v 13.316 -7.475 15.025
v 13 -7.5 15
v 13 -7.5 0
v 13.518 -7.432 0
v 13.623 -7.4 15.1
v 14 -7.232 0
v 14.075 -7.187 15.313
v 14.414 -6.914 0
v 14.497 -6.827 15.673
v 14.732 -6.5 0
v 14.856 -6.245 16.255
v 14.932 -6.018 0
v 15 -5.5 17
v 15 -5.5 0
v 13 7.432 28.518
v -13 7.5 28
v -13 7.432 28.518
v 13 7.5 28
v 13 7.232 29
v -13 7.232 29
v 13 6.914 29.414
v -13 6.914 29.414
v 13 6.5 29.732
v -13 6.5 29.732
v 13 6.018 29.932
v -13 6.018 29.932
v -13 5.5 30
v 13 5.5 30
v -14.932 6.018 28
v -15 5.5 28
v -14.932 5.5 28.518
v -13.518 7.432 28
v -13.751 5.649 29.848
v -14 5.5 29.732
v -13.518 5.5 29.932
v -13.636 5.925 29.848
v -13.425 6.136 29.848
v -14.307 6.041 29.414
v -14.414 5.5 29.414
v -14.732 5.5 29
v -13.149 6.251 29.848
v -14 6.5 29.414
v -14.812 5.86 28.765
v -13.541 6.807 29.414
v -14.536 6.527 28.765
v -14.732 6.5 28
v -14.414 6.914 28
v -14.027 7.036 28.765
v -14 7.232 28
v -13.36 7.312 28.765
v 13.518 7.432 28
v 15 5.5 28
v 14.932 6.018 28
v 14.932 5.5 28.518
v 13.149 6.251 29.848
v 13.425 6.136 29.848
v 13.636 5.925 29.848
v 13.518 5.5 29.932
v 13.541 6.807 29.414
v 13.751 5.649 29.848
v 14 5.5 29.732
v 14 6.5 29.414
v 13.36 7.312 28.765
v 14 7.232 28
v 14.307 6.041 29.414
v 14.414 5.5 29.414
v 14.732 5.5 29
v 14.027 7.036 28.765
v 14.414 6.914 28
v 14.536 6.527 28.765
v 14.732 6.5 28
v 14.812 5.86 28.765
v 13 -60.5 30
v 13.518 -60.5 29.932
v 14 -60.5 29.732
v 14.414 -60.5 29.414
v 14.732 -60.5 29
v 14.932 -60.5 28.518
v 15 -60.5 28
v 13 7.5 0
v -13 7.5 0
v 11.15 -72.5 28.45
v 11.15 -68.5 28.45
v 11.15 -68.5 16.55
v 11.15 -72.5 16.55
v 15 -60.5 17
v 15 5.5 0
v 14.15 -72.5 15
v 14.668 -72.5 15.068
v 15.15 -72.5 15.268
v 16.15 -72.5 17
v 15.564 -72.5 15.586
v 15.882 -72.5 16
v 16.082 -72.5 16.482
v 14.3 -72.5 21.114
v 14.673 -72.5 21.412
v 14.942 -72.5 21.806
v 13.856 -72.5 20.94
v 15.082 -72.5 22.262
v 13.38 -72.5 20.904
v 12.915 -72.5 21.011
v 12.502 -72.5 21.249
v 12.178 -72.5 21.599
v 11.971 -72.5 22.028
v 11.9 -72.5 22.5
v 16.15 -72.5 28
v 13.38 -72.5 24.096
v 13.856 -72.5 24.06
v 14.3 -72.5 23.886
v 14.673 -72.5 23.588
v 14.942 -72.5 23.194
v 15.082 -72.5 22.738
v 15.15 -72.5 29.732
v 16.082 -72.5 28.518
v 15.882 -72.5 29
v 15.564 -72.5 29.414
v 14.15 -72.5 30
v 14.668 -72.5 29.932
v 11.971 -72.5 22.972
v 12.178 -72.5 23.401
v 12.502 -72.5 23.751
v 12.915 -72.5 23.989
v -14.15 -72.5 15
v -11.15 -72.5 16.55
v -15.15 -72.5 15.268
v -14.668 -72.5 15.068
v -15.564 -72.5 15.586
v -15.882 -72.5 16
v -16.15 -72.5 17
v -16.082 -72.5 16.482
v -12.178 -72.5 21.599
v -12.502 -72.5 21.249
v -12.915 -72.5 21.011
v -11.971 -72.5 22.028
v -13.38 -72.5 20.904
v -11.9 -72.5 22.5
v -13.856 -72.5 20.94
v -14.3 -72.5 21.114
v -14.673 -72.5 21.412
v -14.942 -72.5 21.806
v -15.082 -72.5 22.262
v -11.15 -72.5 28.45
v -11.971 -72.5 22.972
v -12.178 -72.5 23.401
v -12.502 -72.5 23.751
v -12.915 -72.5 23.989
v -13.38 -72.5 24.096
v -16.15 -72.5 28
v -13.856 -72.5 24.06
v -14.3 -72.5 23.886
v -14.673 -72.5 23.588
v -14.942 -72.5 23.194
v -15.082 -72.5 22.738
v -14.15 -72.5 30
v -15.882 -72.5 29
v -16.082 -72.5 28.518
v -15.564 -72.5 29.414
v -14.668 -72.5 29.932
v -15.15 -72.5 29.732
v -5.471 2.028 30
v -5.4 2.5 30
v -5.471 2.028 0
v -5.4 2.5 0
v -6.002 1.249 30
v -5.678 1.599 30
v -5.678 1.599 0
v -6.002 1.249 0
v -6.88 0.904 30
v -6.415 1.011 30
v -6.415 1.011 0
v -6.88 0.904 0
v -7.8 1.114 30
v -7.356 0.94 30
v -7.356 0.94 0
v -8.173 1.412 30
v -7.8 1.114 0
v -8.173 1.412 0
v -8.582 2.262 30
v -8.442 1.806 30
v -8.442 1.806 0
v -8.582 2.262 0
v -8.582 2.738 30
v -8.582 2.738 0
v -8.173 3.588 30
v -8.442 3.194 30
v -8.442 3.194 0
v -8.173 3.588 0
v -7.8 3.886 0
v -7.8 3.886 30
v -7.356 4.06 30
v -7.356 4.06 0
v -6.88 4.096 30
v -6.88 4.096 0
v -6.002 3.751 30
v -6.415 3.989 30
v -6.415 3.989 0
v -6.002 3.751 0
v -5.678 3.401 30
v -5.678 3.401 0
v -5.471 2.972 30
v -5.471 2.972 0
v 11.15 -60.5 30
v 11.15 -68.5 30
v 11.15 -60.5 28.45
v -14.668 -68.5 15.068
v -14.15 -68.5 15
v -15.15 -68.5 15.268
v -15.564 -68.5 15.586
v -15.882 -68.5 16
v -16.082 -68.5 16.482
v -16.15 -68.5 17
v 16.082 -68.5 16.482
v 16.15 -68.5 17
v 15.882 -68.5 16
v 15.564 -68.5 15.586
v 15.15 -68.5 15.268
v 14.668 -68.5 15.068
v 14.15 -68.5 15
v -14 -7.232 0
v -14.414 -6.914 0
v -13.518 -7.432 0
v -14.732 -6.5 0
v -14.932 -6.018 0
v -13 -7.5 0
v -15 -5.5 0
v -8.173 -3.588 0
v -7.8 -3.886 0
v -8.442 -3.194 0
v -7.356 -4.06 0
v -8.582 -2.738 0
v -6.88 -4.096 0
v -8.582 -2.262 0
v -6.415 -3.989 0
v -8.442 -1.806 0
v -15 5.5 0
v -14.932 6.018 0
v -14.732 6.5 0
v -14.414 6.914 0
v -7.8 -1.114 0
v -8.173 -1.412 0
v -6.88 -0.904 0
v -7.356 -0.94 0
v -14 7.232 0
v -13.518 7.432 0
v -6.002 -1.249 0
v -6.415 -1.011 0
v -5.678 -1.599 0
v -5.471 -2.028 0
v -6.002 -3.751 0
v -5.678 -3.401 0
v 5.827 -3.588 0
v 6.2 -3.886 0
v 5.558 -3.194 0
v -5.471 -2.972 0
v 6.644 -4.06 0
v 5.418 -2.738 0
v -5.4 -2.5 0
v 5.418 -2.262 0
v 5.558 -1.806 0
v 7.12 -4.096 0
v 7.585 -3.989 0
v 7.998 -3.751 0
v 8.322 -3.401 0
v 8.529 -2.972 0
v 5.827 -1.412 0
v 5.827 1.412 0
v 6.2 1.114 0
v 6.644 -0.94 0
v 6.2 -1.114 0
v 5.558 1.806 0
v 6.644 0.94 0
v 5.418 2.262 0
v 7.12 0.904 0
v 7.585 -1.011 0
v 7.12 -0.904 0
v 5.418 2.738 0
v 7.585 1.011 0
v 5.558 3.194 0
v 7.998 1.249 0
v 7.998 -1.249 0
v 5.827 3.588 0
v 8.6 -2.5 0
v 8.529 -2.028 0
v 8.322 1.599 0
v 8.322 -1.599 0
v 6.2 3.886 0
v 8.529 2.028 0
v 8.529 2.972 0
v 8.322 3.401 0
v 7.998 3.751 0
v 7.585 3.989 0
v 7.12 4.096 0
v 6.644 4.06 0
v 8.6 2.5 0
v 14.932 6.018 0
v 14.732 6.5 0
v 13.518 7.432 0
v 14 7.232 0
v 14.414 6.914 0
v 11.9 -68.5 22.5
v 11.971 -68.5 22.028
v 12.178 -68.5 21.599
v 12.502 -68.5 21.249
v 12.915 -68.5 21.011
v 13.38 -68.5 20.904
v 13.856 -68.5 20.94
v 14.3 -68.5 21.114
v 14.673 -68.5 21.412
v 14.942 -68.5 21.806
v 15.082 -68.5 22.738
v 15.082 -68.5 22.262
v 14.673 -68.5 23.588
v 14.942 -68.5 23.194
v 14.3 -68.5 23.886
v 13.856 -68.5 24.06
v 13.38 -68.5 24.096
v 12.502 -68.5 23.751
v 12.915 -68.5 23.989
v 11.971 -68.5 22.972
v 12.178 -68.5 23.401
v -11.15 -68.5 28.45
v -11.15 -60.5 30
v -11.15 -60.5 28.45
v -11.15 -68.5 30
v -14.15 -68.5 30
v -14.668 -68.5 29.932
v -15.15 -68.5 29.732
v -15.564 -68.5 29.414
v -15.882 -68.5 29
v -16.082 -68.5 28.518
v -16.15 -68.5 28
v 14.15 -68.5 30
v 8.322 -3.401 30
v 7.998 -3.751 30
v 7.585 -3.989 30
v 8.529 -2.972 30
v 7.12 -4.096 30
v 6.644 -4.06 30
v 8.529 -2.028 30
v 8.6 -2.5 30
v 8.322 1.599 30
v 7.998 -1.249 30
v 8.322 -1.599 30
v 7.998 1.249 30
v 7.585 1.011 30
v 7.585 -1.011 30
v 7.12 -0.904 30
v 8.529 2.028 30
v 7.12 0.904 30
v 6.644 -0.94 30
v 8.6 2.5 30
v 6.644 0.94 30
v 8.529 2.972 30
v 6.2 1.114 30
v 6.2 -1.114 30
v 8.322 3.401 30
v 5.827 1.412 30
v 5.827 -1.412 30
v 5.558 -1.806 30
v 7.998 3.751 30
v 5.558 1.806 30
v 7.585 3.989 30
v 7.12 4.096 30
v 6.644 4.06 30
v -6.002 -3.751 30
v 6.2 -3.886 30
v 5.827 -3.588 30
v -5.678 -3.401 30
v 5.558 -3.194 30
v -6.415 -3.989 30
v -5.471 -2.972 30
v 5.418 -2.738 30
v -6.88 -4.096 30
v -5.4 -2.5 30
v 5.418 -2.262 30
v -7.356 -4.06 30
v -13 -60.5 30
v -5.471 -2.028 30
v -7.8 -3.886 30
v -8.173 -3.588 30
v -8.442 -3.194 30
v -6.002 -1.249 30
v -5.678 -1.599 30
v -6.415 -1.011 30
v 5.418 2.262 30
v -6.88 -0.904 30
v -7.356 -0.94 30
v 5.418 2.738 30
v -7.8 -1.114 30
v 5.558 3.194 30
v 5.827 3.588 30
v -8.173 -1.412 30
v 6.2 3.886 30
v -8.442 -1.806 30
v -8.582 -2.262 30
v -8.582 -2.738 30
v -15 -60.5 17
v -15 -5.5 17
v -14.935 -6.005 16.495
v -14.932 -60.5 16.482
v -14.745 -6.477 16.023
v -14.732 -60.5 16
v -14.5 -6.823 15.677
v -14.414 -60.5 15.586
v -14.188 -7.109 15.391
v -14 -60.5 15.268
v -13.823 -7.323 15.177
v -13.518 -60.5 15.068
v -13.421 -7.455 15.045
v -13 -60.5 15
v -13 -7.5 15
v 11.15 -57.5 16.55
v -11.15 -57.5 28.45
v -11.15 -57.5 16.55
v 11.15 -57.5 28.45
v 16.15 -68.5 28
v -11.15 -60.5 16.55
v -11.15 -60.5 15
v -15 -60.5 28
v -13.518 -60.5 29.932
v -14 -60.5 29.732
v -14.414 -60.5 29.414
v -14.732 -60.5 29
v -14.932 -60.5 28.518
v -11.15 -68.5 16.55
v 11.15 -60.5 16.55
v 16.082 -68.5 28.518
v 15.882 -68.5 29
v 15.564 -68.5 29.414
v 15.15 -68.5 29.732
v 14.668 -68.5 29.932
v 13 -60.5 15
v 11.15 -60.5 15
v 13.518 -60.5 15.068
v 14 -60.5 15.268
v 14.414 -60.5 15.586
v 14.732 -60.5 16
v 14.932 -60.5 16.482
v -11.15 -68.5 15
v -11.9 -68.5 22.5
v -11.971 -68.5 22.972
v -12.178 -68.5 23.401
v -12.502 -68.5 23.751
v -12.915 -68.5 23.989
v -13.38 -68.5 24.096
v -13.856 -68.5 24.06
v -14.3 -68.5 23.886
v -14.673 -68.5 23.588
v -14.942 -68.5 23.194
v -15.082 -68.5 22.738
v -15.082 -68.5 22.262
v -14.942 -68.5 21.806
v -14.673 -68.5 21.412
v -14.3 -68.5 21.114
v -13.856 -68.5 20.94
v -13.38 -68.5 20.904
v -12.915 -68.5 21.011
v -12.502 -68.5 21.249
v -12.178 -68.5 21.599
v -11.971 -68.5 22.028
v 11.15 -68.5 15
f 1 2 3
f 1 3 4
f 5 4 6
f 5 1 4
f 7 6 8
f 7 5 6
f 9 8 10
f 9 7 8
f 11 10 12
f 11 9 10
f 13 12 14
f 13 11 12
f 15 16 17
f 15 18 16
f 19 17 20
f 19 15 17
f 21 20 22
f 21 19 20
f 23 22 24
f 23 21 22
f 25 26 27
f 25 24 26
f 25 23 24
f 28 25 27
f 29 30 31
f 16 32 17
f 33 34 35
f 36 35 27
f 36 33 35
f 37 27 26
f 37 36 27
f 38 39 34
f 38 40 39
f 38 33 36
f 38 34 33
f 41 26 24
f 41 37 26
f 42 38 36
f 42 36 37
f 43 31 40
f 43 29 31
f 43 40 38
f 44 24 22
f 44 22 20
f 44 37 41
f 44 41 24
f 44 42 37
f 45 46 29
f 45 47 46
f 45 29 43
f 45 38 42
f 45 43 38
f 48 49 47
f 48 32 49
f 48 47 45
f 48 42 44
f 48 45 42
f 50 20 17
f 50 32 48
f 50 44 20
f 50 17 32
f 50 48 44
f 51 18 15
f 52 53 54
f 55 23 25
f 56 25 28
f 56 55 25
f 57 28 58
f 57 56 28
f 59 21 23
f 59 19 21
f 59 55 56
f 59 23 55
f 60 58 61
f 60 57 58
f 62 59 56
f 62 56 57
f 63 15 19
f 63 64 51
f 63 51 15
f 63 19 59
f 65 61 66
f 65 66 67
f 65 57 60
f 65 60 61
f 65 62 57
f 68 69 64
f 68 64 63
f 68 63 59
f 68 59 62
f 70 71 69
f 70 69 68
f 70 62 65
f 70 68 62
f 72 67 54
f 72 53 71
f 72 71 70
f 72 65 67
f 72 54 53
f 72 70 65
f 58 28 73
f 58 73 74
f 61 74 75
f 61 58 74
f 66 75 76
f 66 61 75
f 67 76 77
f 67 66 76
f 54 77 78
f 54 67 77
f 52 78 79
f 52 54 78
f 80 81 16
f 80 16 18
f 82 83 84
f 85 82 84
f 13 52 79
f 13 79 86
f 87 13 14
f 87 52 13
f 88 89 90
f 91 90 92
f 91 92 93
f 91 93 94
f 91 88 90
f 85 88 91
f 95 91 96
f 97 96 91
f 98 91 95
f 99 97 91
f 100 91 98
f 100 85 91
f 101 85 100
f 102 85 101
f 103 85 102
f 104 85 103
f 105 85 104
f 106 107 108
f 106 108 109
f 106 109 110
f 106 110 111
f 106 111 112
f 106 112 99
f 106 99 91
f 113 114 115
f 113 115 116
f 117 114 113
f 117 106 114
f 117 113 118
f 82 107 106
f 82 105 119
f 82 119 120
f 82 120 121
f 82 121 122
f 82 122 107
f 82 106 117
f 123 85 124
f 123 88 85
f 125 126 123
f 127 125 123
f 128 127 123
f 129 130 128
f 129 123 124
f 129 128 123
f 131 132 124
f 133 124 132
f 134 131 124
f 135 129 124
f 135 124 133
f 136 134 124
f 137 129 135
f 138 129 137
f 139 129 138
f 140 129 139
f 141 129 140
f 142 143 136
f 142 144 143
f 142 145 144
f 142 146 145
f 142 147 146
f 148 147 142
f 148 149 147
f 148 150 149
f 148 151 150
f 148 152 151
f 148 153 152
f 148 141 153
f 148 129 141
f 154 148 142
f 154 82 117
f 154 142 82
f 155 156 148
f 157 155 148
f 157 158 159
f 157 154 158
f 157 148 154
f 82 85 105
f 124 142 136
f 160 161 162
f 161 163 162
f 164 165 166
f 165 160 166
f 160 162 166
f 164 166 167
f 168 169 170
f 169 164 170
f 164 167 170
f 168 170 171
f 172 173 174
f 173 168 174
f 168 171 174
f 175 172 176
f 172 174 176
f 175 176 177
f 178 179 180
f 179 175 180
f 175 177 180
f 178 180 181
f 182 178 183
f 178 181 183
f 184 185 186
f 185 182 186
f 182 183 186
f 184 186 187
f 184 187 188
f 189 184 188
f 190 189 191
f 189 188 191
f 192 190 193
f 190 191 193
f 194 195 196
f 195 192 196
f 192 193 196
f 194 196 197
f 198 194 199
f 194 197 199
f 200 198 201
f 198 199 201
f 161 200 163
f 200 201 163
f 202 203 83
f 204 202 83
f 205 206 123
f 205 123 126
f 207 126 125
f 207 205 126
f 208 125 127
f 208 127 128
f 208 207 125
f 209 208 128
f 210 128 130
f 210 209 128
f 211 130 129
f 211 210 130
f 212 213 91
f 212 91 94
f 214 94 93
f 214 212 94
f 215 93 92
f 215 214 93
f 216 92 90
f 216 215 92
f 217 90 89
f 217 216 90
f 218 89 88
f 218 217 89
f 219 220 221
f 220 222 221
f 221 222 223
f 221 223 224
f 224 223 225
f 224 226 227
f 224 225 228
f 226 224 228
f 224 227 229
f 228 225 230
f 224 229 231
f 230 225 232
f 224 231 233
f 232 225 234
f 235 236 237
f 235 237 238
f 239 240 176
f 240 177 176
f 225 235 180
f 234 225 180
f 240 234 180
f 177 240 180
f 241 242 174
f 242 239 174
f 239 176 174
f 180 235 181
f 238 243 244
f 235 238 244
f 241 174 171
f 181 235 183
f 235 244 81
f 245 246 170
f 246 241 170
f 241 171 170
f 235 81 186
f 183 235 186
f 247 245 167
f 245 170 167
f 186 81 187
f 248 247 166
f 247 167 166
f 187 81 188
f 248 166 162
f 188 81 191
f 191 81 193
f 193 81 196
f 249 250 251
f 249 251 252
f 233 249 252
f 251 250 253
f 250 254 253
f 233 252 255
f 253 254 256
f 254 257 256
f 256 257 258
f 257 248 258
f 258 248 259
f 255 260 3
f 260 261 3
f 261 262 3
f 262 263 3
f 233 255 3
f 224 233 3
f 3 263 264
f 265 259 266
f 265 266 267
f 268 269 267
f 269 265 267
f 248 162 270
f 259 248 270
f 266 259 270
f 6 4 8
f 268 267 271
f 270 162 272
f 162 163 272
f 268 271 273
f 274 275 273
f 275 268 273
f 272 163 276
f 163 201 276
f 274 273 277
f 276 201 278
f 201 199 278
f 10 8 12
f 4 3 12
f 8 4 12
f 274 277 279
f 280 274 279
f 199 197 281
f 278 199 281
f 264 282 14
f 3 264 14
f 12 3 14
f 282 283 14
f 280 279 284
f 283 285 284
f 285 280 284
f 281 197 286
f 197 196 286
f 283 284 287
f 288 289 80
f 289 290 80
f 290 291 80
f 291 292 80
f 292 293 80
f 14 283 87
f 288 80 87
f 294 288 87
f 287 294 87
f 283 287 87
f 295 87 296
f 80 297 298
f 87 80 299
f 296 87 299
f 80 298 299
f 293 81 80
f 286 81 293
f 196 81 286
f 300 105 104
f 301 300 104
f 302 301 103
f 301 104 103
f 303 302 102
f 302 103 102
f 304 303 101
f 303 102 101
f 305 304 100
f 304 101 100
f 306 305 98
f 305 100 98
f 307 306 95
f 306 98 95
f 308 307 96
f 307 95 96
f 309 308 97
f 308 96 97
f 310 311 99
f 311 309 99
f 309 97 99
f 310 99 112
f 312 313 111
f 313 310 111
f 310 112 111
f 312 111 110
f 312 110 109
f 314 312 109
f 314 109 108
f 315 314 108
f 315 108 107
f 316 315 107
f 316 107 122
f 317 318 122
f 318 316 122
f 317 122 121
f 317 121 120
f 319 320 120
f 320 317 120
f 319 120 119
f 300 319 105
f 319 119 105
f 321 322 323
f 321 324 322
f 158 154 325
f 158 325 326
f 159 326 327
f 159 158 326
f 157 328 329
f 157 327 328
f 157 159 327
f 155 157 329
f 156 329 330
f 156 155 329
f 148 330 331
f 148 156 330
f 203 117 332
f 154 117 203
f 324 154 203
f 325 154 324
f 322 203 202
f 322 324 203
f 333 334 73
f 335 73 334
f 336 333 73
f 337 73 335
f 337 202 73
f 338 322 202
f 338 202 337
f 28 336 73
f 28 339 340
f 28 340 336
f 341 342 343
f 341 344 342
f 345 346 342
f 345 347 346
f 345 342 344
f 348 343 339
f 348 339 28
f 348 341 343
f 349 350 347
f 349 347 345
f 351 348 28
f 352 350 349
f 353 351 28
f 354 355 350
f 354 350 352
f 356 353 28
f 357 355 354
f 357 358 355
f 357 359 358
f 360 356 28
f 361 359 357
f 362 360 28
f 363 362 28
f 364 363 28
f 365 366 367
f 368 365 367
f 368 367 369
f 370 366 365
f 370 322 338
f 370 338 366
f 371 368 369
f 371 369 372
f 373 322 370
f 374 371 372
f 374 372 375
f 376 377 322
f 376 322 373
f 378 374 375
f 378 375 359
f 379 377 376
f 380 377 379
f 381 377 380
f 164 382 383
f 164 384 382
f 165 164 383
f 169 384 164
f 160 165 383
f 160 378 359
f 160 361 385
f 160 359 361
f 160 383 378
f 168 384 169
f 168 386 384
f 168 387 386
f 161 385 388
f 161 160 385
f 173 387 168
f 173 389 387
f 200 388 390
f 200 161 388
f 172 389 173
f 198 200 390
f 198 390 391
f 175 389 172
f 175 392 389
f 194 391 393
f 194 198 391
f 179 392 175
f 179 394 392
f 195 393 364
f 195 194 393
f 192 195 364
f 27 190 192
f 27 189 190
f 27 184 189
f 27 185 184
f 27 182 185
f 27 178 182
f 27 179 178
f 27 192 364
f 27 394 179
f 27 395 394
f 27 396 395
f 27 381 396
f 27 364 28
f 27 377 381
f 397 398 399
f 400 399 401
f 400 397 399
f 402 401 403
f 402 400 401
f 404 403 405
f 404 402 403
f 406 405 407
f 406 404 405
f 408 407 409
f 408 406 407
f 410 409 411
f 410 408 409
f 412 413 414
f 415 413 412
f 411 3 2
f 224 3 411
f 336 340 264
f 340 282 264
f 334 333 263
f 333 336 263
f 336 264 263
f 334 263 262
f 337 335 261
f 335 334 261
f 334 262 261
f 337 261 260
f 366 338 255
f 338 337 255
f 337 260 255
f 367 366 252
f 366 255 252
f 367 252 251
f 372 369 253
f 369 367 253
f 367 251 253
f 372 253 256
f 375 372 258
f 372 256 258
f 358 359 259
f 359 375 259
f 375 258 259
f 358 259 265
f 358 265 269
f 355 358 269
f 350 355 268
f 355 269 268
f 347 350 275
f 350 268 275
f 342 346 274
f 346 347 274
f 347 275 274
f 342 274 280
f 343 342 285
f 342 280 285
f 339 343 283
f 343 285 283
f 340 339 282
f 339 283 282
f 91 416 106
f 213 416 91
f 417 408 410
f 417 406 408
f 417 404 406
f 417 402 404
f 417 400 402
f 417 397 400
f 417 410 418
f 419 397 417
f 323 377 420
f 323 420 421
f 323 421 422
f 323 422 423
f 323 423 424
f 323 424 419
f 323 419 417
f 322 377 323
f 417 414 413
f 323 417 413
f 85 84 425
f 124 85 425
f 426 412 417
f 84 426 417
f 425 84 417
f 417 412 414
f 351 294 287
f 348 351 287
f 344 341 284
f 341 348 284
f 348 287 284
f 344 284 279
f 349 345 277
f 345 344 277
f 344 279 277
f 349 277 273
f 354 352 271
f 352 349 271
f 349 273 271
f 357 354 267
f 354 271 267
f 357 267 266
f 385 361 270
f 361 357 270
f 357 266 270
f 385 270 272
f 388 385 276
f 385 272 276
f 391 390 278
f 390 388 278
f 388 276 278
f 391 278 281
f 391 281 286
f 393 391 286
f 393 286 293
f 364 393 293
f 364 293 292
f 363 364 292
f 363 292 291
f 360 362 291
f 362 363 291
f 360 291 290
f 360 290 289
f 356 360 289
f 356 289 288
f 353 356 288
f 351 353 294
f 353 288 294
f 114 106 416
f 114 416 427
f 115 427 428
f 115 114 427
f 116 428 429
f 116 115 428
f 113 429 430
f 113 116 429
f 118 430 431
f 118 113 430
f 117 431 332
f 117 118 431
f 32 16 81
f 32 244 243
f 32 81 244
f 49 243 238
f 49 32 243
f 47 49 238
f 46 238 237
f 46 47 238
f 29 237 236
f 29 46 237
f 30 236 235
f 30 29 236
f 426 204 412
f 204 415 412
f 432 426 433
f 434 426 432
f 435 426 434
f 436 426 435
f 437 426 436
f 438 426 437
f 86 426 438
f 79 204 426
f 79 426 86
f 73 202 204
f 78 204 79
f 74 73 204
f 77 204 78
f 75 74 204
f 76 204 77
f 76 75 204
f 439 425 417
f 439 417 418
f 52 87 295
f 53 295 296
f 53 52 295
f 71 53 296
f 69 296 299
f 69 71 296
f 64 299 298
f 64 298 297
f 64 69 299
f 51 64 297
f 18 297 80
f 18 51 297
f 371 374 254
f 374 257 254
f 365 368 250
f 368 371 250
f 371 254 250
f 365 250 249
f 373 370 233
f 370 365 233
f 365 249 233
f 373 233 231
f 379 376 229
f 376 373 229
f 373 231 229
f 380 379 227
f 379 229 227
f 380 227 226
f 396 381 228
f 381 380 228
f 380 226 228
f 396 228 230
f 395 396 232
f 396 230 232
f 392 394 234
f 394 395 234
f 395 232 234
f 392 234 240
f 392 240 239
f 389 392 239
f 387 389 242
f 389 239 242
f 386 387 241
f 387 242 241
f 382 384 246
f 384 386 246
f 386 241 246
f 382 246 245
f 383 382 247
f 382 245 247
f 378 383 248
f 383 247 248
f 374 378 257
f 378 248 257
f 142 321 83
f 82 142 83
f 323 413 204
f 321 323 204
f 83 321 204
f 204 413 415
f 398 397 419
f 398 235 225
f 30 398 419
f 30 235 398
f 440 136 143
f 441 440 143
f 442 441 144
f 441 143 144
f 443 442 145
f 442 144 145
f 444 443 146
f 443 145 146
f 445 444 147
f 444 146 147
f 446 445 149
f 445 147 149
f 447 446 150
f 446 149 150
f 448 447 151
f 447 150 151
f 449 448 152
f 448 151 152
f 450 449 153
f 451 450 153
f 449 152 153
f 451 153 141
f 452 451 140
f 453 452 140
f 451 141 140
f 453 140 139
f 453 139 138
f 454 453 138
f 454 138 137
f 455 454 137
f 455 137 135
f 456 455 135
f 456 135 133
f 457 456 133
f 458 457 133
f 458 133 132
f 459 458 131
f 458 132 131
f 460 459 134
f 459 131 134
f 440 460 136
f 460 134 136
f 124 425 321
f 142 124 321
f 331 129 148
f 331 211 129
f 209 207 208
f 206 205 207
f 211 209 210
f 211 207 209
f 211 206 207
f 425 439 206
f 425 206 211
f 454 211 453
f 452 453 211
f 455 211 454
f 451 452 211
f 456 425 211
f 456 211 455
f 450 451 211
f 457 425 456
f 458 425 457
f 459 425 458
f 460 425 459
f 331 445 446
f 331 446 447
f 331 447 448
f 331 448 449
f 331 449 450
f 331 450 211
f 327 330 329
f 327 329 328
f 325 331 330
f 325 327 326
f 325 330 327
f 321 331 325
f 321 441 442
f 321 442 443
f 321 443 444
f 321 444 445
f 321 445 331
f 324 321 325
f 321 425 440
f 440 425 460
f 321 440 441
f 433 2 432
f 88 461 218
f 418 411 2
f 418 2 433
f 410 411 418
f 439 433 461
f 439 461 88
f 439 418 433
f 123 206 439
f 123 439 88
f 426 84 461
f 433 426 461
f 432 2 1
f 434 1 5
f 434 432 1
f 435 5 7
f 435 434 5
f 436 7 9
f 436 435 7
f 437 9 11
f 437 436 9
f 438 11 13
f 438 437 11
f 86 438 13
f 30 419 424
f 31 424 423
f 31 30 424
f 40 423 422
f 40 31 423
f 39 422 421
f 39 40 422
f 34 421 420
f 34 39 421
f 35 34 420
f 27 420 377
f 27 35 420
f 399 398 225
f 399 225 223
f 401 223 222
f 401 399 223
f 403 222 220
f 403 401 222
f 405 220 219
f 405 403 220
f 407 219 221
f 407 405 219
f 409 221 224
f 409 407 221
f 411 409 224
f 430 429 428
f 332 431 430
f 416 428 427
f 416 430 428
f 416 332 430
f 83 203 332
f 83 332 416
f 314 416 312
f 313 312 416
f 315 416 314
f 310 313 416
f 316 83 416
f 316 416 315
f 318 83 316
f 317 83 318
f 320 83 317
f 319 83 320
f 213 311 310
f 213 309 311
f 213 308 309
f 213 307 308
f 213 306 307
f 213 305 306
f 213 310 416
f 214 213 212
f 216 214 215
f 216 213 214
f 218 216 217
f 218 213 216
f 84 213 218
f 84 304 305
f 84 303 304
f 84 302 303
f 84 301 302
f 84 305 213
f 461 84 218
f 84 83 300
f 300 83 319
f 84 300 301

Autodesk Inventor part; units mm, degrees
ref_plane "YZ Plane" through (0, 0, 0) normal (1, 0, 0) x (0, 1, 0)
ref_plane "XZ Plane" through (0, 0, 0) normal (0, 1, 0) x (-1, 0, 0)
ref_plane "XY Plane" through (0, 0, 0) normal (0, 0, 1) x (1, 0, 0)
sketch "Sketch1" plane through (0, 0, 0) normal (0, 0, 1) x (1, 0, 0)
  line L0 (-15, 7.5) -> (15, 7.5)
  line L1 (15, 7.5) -> (15, -7.5)
  line L2 (15, -7.5) -> (-15, -7.5)
  line L3 (-15, -7.5) -> (-15, 7.5)
  line L4 (-15, 7.5) -> (15, -7.5) construction
  line L5 (15, 7.5) -> (-15, -7.5) construction
  line L6 (-15, 0) -> (-7, 0) construction
  line L7 (-7, 0) -> (-7, -2.5) construction
  line L8 (0, 7.5) -> (0, -7.5) construction
  circle A0 centre (-7, -2.5) radius 1.6
  line L9 (0, -7.5) -> (0, 7.5) construction
  circle A1 centre (-7, 2.5) radius 1.6
  circle A2 centre (7, -2.5) radius 1.6
  circle A3 centre (7, 2.5) radius 1.6
  line L10 (7, 2.5) -> (-7, 2.5) construction
  point P0 (0, 0)
  dimension "d0" = 30
  dimension "d1" = 15
  dimension "d3" = 2.5
  dimension "d4" = 3.2
  dimension "d11" = 14
extrude "Extrusion1" add sketch "Sketch1" along normal blind 30
sketch "Sketch2" plane through (-15, -7.5, 0) normal (0, -1, 0) x (1, 0, 0)
  line L0 (0, 30) -> (30, 30) projected
  line L1 (0, 30) -> (30, 30)
  line L2 (30, 30) -> (30, 15)
  line L3 (30, 15) -> (0, 15)
  line L4 (0, 15) -> (0, 30)
  point P0 (15, 0)
  dimension "d7" = 30
  dimension "d8" = 15
extrude "Extrusion2" add sketch "Sketch2" along normal blind 50
sketch "Sketch3" plane through (-15, -57.5, 0) normal (0, -1, 0) x (1, 0, 0)
  line L0 (0, 15) -> (30, 15) projected
  line L1 (15, 15) -> (15, 22.5) construction
  line L2 (15, 22.5) -> (3.85, 22.5) construction
  line L3 (15, 22.5) -> (26.15, 22.5) construction
  line L4 (3.85, 28.45) -> (26.15, 28.45)
  line L5 (26.15, 28.45) -> (26.15, 16.55)
  line L6 (26.15, 16.55) -> (3.85, 16.55)
  line L7 (3.85, 16.55) -> (3.85, 28.45)
  line L8 (3.85, 28.45) -> (26.15, 16.55) construction
  line L9 (26.15, 28.45) -> (3.85, 16.55) construction
  line L10 (0, 30) -> (30, 30)
  line L11 (30, 30) -> (30, 15)
  line L12 (30, 15) -> (0, 15)
  line L13 (0, 15) -> (0, 30)
  line L14 (0, 30) -> (30, 15) construction
  line L15 (30, 30) -> (0, 15) construction
  point P0 (15, 0)
  dimension "d12" = 7.5
  dimension "d14" = 11.15
  dimension "d15" = 11.15
  dimension "d19" = 22.3
  dimension "d20" = 11.9
  dimension "d21" = 15
extrude "Extrusion3" add sketch "Sketch3" along normal blind 15
sketch "Sketch4" plane through (-15, -72.5, 0) normal (0, -1, 0) x (1, 0, 0)
  line L0 (30, 30) -> (0, 30) projected
  line L1 (0, 30) -> (3.85, 30)
  line L2 (3.85, 30) -> (3.85, 15)
  line L3 (3.85, 15) -> (0, 15)
  line L4 (0, 15) -> (0, 30)
  line L5 (30, 0) -> (30, 30) projected
  line L6 (30, 30) -> (26.15, 30)
  line L7 (26.15, 30) -> (26.15, 15)
  line L8 (26.15, 15) -> (30, 15)
  line L9 (30, 15) -> (30, 30)
  point P0 (15, 0)
  dimension "d24" = 15
  dimension "d25" = 15
extrude "Extrusion4" cut sketch "Sketch4" against normal blind 12
sketch "Sketch5" plane through (-11.15, -72.5, 15) normal (-1, 0, 0) x (0, 0, 1)
  line L0 (13.45, 0) -> (15, 0) projected
  line L1 (15, 0) -> (0, 0)
  line L2 (0, 0) -> (0, 4)
  line L3 (0, 4) -> (15, 4)
  line L4 (15, 4) -> (15, 0)
  point P0 (-15, 72.5)
  point P1 (13.45, 0)
  dimension "d28" = 15
  dimension "d29" = 4
extrude "Extrusion5" add sketch "Sketch5" along normal blind 5
sketch "Sketch6" plane through (-15, -72.5, 0) normal (0, -1, 0) x (1, 0, 0)
  line L0 (3.85, 28.45) -> (3.85, 16.55) projected
  circle A0 centre (1.5, 22.5) radius 1.6
  line L1 (26.15, 28.45) -> (3.85, 28.45) construction
  line L2 (15, 28.45) -> (15, 16.55) construction
  line L3 (3.85, 16.55) -> (26.15, 16.55) construction
  point P0 (15, 0)
  dimension "d33" = 3.2
  dimension "d56" = 13.5
extrude "Extrusion6" cut sketch "Sketch6" against normal blind 4
mirror "Mirror1" about plane through (0, 0, 0) normal (1, 0, 0) of "Extrusion5"
mirror "Mirror2" about plane through (0, 0, 0) normal (1, 0, 0) of "Extrusion6"
fillet "Fillet1" radius 2 13 edges at (15, -7.5, 7.5) (15, 7.5, 15) (-15, -7.5, 7.5) (-15, 7.5, 15) (-15, -34, 15) (15, -34, 15) (-15, -26.5, 30) (15, -26.5, 30) (0, 7.5, 30) (16.15, -70.5, 15) (-16.15, -70.5, 15) (-16.15, -70.5, 30) (16.15, -70.5, 30)
properties part number "attachment of brush"
